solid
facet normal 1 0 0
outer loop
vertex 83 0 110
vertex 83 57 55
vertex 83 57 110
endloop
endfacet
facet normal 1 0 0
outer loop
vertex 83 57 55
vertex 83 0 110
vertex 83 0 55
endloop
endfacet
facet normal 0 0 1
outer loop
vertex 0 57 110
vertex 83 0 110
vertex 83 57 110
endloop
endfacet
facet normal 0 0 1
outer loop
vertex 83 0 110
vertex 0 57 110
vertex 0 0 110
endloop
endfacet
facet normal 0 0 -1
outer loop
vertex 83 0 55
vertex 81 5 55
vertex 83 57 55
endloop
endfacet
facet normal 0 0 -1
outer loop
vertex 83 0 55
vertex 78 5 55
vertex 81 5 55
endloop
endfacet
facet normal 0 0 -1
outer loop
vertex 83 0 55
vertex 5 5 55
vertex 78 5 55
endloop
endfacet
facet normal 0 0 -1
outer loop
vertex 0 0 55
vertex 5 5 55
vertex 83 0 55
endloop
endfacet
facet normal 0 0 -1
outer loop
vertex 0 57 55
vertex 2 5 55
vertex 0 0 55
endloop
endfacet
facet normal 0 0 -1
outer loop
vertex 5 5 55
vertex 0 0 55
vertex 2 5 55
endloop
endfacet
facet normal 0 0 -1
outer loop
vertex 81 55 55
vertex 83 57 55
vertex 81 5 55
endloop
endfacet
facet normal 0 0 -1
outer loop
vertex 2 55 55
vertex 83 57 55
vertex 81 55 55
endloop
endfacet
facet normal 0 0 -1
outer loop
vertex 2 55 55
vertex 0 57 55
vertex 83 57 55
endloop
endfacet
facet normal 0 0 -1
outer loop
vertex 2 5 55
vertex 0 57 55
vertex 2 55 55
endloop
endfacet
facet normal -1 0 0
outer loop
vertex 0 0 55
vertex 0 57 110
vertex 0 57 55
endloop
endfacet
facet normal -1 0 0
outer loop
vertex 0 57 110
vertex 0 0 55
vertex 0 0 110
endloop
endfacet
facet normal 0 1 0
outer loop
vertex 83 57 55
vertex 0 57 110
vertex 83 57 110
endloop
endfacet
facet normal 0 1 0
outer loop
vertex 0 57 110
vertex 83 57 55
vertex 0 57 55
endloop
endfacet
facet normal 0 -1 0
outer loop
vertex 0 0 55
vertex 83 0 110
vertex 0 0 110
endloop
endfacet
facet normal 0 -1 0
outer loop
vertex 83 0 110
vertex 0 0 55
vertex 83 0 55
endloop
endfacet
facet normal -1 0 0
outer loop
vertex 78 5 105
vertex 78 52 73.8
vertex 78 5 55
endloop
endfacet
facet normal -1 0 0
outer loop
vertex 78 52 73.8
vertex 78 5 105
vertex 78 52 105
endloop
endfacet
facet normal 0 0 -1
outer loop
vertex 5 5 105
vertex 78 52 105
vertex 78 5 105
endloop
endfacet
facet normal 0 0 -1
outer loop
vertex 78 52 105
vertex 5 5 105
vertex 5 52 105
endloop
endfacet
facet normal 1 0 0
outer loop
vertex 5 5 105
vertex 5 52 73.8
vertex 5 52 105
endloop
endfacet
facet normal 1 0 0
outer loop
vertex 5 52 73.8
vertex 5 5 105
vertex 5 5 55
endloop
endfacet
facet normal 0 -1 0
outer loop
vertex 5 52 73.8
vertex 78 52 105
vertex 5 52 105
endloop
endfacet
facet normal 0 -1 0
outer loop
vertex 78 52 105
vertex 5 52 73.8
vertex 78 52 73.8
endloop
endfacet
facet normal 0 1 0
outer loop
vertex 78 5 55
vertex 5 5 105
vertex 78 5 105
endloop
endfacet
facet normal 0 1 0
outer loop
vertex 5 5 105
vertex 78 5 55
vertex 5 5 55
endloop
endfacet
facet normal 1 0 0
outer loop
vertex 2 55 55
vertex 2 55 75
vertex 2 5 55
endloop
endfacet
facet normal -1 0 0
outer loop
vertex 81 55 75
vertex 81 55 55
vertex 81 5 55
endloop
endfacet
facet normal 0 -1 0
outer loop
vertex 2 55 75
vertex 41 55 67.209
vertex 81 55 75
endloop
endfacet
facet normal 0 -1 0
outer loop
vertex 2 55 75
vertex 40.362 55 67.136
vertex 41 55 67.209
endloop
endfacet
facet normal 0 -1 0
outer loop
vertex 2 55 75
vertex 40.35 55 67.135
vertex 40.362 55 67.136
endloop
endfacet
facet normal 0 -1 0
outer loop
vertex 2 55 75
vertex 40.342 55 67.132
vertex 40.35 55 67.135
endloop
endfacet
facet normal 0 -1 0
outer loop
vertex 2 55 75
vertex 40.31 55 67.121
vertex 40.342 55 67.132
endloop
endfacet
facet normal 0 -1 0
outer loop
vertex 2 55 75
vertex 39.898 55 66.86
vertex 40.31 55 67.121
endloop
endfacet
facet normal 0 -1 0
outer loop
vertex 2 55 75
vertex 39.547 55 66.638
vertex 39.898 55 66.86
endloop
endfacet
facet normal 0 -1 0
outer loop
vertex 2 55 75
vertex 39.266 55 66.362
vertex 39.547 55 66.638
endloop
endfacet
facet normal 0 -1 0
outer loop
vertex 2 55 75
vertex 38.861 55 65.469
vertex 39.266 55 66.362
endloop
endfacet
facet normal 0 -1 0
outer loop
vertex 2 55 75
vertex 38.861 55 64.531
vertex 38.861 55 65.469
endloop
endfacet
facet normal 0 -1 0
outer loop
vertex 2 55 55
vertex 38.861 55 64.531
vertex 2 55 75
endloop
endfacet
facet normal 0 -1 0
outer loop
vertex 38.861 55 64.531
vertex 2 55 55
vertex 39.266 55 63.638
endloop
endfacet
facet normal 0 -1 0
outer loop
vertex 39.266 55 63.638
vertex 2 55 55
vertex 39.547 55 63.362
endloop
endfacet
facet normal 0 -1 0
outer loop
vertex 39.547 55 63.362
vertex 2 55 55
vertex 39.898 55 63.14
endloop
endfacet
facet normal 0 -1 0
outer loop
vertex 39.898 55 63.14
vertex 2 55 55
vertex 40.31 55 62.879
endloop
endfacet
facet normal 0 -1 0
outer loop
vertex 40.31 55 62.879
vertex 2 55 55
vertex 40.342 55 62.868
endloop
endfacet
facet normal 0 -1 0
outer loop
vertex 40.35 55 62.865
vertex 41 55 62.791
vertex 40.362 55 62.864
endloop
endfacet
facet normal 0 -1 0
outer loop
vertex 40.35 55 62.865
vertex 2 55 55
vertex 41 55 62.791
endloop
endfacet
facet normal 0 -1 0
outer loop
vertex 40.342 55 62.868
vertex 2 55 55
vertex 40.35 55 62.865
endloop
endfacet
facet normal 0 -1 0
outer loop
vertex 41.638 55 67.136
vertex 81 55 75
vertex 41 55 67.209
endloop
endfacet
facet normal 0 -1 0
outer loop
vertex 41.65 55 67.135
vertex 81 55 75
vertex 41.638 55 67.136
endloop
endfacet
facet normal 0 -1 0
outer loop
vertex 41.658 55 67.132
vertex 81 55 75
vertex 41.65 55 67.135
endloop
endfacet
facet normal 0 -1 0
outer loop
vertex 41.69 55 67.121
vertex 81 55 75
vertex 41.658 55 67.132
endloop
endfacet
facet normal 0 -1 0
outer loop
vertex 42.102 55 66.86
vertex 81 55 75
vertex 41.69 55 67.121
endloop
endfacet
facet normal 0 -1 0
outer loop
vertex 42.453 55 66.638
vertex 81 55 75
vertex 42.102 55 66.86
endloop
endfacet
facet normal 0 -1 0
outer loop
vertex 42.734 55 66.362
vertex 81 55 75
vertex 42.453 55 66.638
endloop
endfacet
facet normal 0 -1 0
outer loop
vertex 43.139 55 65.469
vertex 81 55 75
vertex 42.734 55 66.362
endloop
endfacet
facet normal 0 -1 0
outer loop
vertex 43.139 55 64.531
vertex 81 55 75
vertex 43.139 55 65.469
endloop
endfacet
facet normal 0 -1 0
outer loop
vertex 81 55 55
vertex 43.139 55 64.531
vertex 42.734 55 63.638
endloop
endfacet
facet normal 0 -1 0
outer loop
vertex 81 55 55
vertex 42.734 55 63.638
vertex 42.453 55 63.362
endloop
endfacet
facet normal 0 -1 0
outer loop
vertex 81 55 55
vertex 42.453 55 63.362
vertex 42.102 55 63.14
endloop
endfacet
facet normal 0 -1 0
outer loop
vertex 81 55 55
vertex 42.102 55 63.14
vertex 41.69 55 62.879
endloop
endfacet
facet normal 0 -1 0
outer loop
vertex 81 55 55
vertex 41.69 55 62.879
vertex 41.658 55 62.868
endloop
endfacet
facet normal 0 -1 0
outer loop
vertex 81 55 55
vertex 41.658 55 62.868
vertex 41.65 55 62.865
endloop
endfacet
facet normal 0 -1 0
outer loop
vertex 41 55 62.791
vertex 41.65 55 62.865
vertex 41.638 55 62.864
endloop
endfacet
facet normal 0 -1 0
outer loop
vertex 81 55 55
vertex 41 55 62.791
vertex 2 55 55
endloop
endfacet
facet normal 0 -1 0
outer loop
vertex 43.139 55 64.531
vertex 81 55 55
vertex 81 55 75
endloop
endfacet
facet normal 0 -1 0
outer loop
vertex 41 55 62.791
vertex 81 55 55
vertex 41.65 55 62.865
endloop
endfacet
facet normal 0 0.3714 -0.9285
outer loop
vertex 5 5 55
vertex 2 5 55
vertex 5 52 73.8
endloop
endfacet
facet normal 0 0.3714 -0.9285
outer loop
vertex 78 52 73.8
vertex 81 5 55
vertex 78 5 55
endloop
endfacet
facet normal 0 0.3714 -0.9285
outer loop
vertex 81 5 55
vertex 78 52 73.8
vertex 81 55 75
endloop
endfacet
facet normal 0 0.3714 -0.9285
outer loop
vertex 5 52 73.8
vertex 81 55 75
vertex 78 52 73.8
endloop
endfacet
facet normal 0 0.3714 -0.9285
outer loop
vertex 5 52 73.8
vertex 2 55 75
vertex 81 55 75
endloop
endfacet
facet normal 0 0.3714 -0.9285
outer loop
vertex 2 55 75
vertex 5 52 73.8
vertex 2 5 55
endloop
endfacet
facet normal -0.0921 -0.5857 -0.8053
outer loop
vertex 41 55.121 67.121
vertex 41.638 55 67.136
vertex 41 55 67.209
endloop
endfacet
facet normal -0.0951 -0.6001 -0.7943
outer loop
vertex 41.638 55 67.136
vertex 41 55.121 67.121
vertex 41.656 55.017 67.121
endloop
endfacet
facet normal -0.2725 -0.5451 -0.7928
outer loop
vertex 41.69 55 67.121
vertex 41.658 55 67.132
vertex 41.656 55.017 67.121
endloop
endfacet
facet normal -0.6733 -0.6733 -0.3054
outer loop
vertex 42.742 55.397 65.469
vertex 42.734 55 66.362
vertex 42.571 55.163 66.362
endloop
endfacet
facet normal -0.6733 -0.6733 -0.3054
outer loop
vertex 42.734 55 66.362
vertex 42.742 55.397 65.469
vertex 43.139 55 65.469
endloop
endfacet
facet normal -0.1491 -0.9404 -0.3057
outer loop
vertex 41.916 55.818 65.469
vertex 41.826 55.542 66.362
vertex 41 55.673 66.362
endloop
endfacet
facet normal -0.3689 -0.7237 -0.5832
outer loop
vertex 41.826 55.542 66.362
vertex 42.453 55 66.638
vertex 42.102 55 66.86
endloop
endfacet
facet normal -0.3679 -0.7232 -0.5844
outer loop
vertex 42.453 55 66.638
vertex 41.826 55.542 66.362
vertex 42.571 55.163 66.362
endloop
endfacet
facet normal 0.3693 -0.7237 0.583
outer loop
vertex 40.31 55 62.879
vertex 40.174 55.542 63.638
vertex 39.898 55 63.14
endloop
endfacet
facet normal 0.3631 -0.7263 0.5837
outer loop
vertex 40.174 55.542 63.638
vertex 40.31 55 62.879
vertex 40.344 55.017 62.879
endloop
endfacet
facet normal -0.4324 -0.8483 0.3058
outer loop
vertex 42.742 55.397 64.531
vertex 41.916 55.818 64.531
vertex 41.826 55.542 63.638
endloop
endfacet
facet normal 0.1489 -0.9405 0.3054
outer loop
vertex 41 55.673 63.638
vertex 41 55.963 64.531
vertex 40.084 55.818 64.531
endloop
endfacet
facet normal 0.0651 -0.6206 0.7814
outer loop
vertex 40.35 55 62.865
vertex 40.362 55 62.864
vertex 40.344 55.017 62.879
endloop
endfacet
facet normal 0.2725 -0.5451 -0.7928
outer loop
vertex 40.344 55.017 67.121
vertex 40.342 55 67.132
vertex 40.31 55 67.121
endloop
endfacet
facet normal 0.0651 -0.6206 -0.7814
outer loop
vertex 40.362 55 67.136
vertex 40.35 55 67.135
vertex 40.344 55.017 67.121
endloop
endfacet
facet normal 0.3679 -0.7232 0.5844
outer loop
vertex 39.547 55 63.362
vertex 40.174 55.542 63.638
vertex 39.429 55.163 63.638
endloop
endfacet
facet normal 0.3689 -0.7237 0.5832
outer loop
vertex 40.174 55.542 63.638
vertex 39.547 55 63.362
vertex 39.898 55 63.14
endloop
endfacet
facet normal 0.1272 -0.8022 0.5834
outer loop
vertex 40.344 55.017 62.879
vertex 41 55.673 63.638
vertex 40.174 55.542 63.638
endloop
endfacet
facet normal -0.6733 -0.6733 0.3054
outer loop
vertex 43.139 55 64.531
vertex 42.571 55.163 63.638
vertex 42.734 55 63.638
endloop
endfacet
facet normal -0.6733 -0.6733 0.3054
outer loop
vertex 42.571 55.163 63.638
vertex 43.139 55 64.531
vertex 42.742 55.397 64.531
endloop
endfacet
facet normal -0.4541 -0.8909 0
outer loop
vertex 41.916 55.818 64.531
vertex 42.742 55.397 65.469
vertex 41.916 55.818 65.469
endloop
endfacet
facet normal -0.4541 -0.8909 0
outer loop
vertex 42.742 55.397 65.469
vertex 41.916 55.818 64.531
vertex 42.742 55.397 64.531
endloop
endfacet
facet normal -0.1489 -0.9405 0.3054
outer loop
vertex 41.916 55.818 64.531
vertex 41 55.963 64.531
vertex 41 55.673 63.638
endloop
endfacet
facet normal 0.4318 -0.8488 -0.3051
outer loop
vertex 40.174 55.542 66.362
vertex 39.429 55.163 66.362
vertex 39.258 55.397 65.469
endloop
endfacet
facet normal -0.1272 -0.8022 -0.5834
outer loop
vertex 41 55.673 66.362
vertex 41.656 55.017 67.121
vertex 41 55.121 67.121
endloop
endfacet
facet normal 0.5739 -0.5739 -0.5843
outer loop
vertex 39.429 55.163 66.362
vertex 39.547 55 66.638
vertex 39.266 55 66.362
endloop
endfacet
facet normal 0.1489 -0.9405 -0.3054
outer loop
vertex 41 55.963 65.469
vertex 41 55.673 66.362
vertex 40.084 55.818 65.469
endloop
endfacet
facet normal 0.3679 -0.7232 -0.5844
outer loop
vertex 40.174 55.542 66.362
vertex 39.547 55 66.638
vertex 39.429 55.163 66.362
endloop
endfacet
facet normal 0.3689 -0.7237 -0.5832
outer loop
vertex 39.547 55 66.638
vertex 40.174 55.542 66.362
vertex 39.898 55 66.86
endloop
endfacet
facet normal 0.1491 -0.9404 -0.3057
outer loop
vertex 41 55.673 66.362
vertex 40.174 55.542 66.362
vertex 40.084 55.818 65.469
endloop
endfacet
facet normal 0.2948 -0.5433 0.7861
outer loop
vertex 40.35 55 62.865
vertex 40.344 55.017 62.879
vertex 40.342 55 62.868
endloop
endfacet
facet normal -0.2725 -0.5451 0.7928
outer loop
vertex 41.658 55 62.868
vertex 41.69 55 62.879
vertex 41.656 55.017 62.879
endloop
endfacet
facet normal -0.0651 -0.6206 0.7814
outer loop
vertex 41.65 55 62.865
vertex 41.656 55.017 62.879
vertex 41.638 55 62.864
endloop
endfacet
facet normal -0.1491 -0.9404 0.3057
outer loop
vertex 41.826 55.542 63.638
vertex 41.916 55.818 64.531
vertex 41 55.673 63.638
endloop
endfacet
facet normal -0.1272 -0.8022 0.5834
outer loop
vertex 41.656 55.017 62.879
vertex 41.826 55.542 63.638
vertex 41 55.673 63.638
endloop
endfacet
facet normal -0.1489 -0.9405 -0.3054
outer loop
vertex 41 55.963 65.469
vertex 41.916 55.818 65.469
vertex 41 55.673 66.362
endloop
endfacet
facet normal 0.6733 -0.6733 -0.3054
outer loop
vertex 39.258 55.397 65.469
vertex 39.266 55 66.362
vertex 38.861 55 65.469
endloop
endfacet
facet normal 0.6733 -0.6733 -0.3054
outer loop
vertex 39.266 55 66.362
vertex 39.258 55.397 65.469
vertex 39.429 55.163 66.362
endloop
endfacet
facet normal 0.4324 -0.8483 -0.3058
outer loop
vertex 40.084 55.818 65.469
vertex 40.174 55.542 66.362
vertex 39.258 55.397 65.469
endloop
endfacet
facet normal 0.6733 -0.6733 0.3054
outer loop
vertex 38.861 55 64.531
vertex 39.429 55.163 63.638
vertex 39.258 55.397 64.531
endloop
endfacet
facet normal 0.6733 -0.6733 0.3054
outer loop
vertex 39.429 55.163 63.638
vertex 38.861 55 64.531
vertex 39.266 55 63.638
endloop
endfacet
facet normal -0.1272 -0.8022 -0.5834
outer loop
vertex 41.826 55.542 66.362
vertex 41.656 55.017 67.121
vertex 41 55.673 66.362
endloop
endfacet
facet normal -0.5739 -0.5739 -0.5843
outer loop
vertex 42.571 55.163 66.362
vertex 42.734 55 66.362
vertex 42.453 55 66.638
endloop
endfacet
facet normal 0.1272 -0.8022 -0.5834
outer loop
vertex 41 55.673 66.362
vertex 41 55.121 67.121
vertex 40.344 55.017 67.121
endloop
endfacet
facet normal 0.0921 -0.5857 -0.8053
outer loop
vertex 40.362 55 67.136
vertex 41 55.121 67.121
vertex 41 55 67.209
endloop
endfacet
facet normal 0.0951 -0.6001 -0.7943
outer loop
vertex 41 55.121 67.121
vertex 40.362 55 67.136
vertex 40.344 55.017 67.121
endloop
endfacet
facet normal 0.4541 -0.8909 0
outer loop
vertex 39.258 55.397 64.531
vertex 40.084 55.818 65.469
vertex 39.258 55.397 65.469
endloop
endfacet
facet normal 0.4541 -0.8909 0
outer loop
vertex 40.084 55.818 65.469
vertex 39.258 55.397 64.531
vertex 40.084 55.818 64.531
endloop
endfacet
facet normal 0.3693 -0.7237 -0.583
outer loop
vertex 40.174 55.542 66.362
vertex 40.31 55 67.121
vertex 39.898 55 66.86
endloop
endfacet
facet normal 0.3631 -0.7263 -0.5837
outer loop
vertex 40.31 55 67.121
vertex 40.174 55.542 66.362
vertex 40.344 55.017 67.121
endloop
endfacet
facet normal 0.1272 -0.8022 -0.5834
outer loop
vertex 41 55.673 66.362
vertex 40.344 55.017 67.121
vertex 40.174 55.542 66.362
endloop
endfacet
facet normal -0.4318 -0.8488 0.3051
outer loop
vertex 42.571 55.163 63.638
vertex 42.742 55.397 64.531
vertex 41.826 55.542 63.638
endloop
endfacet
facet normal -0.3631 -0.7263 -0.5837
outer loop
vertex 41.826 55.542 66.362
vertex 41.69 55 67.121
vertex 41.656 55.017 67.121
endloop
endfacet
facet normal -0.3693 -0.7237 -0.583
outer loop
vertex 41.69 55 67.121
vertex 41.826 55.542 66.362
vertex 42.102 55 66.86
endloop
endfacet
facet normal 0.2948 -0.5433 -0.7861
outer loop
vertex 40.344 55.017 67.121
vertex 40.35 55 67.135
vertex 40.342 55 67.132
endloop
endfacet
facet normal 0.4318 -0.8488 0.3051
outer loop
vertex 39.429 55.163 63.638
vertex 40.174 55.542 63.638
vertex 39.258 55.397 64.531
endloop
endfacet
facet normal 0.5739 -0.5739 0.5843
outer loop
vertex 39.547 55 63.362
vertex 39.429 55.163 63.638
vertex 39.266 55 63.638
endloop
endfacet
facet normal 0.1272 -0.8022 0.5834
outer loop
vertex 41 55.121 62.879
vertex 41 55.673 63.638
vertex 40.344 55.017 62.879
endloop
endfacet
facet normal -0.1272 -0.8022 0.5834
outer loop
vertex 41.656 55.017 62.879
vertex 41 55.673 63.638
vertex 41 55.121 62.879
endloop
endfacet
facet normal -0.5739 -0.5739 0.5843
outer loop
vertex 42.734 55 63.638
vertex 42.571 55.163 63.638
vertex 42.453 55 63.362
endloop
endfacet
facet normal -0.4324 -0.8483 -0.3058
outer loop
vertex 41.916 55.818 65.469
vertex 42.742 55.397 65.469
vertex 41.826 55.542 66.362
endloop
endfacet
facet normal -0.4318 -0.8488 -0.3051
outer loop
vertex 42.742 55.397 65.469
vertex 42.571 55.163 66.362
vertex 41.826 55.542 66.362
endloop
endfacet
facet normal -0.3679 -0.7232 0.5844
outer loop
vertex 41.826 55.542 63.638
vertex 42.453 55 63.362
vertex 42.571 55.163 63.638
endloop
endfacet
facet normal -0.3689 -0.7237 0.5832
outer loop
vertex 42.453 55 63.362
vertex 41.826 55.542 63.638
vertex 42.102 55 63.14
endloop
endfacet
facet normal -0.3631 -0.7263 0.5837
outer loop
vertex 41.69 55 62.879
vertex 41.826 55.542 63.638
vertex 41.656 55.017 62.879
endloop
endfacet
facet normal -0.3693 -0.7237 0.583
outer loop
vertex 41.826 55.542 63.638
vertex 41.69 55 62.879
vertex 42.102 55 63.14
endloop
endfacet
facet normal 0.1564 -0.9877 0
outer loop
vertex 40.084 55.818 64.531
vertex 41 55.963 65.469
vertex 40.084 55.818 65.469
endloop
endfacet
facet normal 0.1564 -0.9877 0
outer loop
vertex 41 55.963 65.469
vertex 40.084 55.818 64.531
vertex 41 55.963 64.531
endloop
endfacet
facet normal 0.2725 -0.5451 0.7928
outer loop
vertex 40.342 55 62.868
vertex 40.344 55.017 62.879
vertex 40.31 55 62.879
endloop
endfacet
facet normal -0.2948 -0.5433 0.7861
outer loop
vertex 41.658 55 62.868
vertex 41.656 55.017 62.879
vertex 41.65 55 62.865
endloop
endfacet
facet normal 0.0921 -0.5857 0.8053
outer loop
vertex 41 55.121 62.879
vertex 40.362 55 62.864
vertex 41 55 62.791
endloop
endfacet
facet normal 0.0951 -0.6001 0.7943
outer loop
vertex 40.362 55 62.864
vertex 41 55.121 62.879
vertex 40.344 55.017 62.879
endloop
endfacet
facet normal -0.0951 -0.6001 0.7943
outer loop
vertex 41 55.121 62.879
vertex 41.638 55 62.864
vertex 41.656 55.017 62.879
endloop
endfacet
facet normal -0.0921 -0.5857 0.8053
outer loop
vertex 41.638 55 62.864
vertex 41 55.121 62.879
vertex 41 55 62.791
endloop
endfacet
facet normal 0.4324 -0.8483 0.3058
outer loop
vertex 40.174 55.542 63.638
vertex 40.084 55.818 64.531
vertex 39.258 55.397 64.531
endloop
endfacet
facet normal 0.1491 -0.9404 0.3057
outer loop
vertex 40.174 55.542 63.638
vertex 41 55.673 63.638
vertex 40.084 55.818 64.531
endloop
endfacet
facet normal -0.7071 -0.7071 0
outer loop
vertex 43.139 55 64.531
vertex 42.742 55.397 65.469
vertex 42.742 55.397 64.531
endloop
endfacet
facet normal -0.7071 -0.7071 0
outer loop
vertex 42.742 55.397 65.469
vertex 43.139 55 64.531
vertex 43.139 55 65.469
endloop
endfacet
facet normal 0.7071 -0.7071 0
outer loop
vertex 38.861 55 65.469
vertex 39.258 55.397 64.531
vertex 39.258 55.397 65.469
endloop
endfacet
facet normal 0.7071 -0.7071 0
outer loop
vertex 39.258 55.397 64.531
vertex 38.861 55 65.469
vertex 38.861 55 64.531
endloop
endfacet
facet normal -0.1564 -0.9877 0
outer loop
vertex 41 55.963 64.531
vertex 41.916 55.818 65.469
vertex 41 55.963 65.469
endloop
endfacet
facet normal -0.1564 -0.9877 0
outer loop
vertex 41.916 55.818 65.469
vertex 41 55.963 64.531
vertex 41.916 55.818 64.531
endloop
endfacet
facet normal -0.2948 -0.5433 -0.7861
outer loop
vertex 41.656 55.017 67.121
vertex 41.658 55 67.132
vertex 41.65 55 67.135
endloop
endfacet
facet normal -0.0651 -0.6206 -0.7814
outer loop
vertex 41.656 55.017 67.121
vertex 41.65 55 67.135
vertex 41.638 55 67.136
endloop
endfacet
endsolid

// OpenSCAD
union() {
	difference() {
		difference() {
			difference() {
				translate(v = [0, 0, 55]) {
					cube(size = [83, 57, 55]);
				}
				translate(v = [5, 5, 5]) {
					cube(size = [73, 47, 100]);
				}
			}
			translate(v = [2, 0, 55]) {
				rotate(a = 90, v = [0, 0, 1]) {
					rotate(a = 90, v = [1, 0, 0]) {
						linear_extrude(height = 79) {
							polygon(paths = [[0, 1, 2, 3]], points = [[5, -2], [55, -2], [55, 20], [5, 0]]);
						}
					}
				}
			}
		}
		translate(v = [41, 53.0000000000, 65.0000000000]) {
			sphere($fn = 20, r = 3);
		}
	}
}
